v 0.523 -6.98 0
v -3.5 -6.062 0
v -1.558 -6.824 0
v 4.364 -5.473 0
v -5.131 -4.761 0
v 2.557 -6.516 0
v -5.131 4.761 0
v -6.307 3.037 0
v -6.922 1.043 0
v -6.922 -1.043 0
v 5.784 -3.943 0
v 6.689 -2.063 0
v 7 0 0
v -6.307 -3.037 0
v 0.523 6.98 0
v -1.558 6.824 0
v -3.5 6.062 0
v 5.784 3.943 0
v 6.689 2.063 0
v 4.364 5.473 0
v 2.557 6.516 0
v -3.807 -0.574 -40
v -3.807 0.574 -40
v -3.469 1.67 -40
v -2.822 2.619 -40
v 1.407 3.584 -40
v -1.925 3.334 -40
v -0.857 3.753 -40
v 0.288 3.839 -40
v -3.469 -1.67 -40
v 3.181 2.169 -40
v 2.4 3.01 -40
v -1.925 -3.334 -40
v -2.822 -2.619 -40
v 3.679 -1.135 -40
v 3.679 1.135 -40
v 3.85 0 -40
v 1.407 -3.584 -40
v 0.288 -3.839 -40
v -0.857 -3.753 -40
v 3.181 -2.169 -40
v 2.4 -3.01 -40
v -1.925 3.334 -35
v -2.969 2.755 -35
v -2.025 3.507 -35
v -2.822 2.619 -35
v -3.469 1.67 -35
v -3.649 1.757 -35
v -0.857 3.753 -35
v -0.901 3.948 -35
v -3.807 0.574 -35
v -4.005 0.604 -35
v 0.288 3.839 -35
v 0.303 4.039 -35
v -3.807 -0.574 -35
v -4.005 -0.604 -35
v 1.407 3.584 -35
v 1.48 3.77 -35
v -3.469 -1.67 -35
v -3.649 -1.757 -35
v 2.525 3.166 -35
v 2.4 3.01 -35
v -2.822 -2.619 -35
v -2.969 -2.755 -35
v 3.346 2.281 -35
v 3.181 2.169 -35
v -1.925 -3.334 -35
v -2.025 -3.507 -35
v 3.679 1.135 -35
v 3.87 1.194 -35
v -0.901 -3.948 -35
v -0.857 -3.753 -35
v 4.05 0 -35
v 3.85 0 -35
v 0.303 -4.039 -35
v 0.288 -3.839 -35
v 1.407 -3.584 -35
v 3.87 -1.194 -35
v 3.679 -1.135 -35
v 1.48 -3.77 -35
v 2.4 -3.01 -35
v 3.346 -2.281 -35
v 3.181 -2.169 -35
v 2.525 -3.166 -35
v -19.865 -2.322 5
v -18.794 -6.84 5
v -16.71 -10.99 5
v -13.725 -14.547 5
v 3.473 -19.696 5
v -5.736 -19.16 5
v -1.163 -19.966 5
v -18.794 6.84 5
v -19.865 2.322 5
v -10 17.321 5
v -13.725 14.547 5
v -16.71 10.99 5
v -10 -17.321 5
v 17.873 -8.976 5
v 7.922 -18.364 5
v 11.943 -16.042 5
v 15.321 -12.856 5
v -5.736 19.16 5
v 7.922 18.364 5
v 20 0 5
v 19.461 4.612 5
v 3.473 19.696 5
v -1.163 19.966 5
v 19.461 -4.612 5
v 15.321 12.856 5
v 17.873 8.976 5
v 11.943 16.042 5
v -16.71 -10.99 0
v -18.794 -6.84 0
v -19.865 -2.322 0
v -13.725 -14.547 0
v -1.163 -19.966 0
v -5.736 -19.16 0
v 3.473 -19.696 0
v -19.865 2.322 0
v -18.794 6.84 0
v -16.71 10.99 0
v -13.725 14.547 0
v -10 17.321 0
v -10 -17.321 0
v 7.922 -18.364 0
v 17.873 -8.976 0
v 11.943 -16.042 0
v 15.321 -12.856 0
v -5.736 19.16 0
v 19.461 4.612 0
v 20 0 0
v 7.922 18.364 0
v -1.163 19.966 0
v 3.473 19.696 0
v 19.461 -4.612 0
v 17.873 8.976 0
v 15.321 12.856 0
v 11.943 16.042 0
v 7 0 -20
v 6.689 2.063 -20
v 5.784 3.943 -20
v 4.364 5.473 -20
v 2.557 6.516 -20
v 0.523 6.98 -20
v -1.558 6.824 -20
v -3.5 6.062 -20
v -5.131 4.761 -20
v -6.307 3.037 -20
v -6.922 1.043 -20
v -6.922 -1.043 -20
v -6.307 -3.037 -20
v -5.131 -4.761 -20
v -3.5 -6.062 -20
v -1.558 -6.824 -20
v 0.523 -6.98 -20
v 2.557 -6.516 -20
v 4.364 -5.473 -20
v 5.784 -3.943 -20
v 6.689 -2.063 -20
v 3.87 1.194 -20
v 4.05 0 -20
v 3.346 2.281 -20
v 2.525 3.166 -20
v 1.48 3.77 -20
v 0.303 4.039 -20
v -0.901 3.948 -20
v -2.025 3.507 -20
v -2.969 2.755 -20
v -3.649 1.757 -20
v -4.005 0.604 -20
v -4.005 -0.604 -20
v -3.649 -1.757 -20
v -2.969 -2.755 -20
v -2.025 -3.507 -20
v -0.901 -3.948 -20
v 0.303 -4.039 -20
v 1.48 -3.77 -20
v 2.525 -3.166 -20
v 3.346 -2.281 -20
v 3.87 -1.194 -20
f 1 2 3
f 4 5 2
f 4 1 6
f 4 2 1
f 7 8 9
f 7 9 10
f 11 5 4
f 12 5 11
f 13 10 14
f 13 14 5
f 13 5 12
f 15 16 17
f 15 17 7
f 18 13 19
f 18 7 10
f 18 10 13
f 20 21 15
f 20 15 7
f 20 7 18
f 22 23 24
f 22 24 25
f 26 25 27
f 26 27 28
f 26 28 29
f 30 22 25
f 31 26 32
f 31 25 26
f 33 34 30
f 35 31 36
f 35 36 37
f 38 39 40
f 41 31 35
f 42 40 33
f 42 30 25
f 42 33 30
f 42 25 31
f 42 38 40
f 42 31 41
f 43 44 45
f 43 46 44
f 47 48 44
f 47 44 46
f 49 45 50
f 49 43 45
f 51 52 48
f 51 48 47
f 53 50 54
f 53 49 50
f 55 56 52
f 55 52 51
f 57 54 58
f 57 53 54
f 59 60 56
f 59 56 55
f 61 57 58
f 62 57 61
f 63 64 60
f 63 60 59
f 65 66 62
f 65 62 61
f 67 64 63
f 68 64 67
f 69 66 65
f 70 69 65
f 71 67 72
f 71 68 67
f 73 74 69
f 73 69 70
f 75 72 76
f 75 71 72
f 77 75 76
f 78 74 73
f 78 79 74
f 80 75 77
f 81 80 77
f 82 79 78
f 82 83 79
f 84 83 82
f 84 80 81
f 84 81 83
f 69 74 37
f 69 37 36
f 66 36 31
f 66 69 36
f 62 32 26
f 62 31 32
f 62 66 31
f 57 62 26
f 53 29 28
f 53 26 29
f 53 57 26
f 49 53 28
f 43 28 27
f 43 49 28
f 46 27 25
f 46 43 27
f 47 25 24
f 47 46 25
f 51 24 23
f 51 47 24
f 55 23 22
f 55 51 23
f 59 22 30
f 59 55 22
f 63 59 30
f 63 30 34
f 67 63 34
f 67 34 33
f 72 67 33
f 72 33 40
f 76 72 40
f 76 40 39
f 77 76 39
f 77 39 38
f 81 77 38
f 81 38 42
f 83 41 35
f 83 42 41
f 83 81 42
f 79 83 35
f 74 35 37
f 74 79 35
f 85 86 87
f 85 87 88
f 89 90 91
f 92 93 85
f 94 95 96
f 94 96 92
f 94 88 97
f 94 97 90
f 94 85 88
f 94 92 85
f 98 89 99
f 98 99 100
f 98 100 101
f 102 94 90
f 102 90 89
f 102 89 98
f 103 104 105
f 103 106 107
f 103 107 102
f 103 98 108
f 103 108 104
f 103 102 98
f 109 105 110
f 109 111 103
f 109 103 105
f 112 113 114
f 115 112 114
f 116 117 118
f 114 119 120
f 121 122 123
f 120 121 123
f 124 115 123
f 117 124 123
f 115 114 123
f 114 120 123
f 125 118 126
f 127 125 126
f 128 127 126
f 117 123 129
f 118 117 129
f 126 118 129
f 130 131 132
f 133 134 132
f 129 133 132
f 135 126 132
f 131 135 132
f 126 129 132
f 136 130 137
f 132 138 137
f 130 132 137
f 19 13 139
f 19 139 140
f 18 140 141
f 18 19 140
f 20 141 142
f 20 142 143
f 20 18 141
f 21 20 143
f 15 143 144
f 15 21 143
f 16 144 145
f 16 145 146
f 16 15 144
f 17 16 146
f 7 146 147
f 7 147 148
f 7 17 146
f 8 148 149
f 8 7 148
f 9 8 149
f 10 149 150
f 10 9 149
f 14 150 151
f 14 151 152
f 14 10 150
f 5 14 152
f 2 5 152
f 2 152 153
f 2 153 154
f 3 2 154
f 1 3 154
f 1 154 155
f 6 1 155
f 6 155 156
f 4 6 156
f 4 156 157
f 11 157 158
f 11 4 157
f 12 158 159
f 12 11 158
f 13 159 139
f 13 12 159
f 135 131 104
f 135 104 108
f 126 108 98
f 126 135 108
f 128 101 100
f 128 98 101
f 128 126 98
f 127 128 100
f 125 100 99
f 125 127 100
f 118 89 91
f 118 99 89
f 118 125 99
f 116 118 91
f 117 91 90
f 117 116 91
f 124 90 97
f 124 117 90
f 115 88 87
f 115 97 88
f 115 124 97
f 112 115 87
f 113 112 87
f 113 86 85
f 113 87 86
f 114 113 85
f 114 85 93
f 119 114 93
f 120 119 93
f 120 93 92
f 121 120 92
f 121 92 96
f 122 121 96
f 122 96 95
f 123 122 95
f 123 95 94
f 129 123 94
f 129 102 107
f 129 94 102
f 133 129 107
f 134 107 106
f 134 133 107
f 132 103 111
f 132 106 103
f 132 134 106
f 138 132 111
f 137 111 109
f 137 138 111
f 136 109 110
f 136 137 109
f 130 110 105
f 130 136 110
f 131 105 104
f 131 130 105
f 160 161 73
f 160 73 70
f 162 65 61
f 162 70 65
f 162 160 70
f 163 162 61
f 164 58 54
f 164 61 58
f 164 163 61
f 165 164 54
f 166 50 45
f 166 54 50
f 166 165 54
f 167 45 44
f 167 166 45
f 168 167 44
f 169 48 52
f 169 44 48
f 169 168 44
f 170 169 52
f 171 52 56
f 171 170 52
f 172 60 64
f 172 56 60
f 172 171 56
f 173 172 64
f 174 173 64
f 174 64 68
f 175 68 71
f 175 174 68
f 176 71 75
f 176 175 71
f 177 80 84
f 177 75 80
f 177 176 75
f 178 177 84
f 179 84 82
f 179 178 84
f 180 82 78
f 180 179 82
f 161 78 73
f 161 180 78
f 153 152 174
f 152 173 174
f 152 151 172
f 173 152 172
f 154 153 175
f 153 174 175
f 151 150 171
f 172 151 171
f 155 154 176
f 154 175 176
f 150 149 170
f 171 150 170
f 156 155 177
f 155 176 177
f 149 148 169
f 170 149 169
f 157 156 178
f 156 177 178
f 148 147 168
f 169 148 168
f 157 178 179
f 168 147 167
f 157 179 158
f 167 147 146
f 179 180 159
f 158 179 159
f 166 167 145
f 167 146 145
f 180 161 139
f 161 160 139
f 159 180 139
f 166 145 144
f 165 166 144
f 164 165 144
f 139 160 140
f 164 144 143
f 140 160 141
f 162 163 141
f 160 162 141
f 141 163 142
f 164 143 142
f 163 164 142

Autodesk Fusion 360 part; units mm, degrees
sketch "Sketch1" plane through (0, 0, 0) normal (0, 0, 1) x (1, 0, 0)
  circle A0 centre (0, 0) radius 7
  circle A1 centre (0, 0) radius 20
  dimension "d8" = 14
  dimension "d58" = 40
extrude "Extrude12" add sketch "Sketch1" along normal blind 5 makes body 1
extrude "Extrude2" add sketch "Sketch1" against normal blind 20 separate body contours A0 makes body 2
extrude "Extrude1" add sketch "Sketch1" against normal blind 20 separate body contours A0 makes body 3
sketch "Sketch3" plane through (0, 0, -20) normal (0, 0, -1) x (1, 0, 0)
  circle A0 centre (0, 0) radius 7
  circle A1 centre (0, 0) radius 4.05
  dimension "d31" = 8.1
extrude "Extrude6" add sketch "Sketch3" along normal blind 15 contours A1 bodies 2 3
sketch "Sketch6" plane through (0, 0, -35) normal (0, 0, -1) x (1, 0, 0)
  circle A0 centre (0, 0) radius 3.85
  circle A1 centre (0, 0) radius 4.05
  dimension "d47" = 7.7
extrude "Extrude9" add sketch "Sketch6" along normal blind 5 contours A0 bodies 2
delete_face "DeleteFace1" 1 faces at (6.9913, -0.3489, 3.3333) on bodies 1
equation "lower_part_outer_radius = 7 mm"
equation "lower_part_length = 20 mm"
equation "upper_part_outer_radius = 3.85 mm"
equation "upper_part_length = 5 mm"
equation "d8 = lower_part_outer_radius * 2"
equation "extra = 100 mm"
equation "d11 = -lower_part_length"
equation "d14 = -lower_part_length"
equation "d31 = bearing_part_outer_radius * 2"
equation "d32 = bearing_part_length"
equation "bearing_part_outer_radius = 4.05 mm"
equation "bearing_part_length = 15 mm"
equation "d47 = upper_part_outer_radius * 2"
equation "d48 = upper_part_length"
equation "base_part_outer_radius = 20 mm"
equation "base_part_length = 5 mm"
equation "d58 = base_part_outer_radius * 2"
equation "d59 = base_part_length"
